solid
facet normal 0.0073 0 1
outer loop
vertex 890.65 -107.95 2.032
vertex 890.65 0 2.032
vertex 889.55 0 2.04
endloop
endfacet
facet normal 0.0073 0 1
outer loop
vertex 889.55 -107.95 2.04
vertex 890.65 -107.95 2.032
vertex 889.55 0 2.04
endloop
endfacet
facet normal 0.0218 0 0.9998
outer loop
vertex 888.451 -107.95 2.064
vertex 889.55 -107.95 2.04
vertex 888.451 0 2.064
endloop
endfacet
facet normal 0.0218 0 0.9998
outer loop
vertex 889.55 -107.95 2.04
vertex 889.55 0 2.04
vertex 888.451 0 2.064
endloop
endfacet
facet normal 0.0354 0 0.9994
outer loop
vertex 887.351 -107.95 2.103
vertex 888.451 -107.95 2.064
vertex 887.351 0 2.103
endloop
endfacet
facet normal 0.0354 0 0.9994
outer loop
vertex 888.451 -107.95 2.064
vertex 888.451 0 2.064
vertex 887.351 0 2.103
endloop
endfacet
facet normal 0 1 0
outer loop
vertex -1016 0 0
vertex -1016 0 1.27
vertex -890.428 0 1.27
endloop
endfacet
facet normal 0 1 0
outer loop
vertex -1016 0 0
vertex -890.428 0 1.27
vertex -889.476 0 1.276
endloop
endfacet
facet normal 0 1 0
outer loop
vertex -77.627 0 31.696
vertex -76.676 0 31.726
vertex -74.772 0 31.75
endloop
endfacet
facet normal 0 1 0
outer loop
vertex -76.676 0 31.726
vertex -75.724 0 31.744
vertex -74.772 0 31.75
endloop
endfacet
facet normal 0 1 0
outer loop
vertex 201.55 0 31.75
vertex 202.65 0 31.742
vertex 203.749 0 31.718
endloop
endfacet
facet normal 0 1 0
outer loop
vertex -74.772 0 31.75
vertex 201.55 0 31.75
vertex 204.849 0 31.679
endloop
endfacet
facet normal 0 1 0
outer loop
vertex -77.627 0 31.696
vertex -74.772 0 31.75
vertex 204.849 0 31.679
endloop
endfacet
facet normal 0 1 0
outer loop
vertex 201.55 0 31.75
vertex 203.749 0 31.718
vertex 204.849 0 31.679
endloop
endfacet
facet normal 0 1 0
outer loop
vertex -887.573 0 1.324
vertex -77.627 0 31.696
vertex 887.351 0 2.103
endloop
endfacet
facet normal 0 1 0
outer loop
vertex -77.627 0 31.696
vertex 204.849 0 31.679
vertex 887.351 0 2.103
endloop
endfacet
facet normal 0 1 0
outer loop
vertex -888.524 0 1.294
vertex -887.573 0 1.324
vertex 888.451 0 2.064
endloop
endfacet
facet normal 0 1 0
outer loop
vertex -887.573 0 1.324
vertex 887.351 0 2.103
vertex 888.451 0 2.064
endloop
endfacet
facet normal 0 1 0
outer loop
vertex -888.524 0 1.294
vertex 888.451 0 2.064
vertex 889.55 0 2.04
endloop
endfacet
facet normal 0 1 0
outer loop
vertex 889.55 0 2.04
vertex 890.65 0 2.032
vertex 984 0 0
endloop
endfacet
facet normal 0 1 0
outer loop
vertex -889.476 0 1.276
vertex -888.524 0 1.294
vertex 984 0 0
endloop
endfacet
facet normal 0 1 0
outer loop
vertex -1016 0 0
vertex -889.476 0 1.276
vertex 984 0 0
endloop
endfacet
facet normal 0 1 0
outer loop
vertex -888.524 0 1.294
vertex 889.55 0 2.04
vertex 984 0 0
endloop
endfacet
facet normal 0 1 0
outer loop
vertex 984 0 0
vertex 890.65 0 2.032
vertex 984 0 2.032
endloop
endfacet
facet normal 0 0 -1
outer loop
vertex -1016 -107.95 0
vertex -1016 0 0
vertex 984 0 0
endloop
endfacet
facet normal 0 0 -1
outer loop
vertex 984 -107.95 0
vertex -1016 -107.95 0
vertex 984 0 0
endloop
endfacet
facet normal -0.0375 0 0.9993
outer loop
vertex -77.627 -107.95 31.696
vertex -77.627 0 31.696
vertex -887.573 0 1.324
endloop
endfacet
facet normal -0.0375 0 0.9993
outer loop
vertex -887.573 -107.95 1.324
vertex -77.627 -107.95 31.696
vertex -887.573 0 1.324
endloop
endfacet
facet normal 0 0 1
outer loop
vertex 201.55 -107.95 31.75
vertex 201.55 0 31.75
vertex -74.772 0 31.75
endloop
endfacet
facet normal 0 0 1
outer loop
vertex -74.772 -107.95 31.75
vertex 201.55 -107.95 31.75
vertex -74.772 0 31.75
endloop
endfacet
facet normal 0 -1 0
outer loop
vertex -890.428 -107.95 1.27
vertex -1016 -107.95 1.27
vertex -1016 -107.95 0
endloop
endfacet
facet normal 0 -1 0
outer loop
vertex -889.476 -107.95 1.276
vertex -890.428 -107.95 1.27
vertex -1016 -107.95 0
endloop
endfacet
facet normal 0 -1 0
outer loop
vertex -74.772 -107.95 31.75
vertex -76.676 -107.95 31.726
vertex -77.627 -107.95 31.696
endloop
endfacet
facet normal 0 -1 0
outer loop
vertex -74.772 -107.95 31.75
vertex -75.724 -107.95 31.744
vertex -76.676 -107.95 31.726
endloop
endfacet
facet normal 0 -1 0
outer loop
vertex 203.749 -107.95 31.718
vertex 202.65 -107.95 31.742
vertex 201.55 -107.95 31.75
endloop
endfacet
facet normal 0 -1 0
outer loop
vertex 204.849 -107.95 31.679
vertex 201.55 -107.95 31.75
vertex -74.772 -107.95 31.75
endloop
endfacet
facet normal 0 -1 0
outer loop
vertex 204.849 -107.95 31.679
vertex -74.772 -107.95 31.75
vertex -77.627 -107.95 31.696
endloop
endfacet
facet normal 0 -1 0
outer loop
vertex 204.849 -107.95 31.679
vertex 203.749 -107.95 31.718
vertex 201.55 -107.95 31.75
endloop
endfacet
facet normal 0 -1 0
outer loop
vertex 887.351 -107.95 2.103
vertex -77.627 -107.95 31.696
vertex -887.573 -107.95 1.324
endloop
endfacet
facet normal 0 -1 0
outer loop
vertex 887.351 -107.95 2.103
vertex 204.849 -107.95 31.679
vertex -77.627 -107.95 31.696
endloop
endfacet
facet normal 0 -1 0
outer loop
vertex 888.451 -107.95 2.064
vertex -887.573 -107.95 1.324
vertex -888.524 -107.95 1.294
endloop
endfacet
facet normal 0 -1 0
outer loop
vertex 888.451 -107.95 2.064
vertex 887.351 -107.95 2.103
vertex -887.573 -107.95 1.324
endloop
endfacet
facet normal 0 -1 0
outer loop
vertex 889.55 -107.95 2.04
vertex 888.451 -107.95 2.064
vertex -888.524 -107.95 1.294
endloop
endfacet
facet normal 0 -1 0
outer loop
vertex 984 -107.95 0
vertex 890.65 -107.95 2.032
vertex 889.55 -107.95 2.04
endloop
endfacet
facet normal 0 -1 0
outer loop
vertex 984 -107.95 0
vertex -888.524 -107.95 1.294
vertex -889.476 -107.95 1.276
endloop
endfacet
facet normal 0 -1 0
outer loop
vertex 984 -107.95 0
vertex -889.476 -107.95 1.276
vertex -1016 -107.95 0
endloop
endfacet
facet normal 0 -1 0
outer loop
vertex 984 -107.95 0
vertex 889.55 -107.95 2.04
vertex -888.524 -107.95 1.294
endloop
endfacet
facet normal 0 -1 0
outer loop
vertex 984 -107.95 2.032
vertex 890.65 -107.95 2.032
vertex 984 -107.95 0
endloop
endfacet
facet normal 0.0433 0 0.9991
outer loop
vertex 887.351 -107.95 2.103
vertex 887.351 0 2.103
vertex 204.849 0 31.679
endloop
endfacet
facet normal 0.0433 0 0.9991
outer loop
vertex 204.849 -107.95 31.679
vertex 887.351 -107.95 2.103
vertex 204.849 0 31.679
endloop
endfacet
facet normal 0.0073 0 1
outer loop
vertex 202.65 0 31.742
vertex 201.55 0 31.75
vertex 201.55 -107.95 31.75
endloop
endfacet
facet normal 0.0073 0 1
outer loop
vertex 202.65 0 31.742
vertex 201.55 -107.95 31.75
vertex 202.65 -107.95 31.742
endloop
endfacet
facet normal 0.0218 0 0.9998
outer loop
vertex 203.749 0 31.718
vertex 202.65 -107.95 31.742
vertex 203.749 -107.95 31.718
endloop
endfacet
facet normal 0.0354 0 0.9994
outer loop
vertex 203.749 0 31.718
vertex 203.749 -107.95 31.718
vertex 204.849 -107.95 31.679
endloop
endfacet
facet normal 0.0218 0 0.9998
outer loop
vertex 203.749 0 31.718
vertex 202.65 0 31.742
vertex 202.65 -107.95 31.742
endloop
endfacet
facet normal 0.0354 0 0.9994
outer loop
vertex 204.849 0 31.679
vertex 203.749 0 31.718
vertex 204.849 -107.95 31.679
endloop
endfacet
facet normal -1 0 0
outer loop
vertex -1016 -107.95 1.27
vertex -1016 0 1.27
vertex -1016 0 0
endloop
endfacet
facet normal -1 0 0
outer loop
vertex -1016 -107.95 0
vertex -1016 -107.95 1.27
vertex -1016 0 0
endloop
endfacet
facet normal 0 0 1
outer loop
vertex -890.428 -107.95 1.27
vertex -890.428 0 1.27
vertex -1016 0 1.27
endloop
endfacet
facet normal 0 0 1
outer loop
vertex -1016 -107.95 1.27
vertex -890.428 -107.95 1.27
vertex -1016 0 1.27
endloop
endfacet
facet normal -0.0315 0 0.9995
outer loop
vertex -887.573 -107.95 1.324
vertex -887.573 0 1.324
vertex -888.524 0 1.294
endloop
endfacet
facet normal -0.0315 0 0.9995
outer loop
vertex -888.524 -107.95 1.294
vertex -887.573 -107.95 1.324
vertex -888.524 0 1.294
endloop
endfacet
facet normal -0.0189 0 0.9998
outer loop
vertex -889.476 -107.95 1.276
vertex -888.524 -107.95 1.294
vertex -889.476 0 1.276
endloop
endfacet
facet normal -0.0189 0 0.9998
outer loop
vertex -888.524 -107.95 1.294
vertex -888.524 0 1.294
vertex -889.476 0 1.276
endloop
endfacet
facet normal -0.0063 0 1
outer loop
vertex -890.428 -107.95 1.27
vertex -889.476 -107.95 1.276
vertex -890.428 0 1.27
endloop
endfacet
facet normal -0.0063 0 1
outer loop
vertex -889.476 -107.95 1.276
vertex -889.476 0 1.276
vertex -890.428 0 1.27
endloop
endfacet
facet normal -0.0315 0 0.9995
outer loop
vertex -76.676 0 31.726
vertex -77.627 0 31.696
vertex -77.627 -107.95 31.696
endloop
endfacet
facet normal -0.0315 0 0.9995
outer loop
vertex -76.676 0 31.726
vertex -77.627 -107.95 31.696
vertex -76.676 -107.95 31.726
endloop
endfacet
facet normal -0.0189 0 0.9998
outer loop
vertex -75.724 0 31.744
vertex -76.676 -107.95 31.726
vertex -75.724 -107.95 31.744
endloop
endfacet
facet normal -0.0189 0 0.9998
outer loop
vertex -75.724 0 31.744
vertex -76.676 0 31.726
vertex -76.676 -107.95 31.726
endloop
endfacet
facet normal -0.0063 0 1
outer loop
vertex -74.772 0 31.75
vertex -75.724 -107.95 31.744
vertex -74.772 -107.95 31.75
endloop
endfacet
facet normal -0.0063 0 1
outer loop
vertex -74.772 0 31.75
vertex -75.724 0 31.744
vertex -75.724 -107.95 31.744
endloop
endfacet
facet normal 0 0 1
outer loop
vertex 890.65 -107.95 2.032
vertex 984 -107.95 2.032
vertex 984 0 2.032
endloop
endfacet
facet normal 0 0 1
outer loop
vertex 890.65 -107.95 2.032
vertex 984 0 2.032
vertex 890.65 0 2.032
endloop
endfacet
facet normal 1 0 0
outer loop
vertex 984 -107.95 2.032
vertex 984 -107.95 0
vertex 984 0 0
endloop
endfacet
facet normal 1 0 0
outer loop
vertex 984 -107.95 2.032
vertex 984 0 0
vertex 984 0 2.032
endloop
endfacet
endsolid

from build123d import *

# Parameters (mm, degrees)
F1_DEPTH    = 107.95
F2_T1_DEPTH = 107.95
F3_T1_DEPTH = 107.95
F3_T3_DEPTH = 115.0912402897
F3_T5_DEPTH = 116.2011283703


# Not quite as in the source:
# - a fillet or chamfer that OpenCascade refuses, or shapes differently, is made with other operations: its cross-section is extruded or revolved along the edge and cut away or added


with BuildPart() as f1:
    # F0 (on Front) → F1 (new body)
    with BuildSketch(Plane.XZ):
        Polygon((-1016, 1.27), (-1016, 0), (984, 0), (984, 2.032), (889, 2.032), (203.2, 31.75), (-76.2, 31.75), (-889, 1.27), align=None)
    extrude(amount=F1_DEPTH)

    # F2: fillet of radius 76.2 on 1 edges, made by hand

    # F2_s2 → F2_t1 (join)
    with BuildSketch(Plane.XZ):
        with BuildLine():
            ThreePointArc((-887.5727551211, 1.323521683), (-889.0002508168, 1.2833815957), (-890.4282480579, 1.27))
            Line((-890.4282480579, 1.27), (-889, 1.27))
            Line((-889, 1.27), (-887.5727551211, 1.323521683))
        make_face()
    extrude(amount=F2_T1_DEPTH)

    # F3: fillet of radius 76.2 on 3 edges, made by hand

    # F3_s2 → F3_t1 (join)
    with BuildSketch(Plane.XZ):
        with BuildLine():
            ThreePointArc((890.6502256741, 2.032), (889.0003868453, 2.0498627772), (887.3513215259, 2.1034427339))
            Line((887.3513215259, 2.1034427339), (889, 2.032))
            Line((889, 2.032), (890.6502256741, 2.032))
        make_face()
    extrude(amount=F3_T1_DEPTH)

    # F3_s4 → F3_t3 (cut)
    with BuildSketch(Plane.XZ.offset(-3.5706201449)):
        with BuildLine():
            ThreePointArc((-77.6272448789, 31.696478317), (-76.1997491832, 31.7366184043), (-74.7717519421, 31.75))
            Line((-74.7717519421, 31.75), (-76.2, 31.75))
            Line((-76.2, 31.75), (-77.6272448789, 31.696478317))
        make_face()
    extrude(amount=F3_T3_DEPTH, mode=Mode.SUBTRACT)

    # F3_s6 → F3_t5 (cut)
    with BuildSketch(Plane.XZ.offset(-4.1255641851)):
        with BuildLine():
            ThreePointArc((201.5497743259, 31.75), (203.1996131547, 31.7321372228), (204.8486784741, 31.6785572661))
            Line((204.8486784741, 31.6785572661), (203.2, 31.75))
            Line((203.2, 31.75), (201.5497743259, 31.75))
        make_face()
    extrude(amount=F3_T5_DEPTH, mode=Mode.SUBTRACT)


solid = f1.part
